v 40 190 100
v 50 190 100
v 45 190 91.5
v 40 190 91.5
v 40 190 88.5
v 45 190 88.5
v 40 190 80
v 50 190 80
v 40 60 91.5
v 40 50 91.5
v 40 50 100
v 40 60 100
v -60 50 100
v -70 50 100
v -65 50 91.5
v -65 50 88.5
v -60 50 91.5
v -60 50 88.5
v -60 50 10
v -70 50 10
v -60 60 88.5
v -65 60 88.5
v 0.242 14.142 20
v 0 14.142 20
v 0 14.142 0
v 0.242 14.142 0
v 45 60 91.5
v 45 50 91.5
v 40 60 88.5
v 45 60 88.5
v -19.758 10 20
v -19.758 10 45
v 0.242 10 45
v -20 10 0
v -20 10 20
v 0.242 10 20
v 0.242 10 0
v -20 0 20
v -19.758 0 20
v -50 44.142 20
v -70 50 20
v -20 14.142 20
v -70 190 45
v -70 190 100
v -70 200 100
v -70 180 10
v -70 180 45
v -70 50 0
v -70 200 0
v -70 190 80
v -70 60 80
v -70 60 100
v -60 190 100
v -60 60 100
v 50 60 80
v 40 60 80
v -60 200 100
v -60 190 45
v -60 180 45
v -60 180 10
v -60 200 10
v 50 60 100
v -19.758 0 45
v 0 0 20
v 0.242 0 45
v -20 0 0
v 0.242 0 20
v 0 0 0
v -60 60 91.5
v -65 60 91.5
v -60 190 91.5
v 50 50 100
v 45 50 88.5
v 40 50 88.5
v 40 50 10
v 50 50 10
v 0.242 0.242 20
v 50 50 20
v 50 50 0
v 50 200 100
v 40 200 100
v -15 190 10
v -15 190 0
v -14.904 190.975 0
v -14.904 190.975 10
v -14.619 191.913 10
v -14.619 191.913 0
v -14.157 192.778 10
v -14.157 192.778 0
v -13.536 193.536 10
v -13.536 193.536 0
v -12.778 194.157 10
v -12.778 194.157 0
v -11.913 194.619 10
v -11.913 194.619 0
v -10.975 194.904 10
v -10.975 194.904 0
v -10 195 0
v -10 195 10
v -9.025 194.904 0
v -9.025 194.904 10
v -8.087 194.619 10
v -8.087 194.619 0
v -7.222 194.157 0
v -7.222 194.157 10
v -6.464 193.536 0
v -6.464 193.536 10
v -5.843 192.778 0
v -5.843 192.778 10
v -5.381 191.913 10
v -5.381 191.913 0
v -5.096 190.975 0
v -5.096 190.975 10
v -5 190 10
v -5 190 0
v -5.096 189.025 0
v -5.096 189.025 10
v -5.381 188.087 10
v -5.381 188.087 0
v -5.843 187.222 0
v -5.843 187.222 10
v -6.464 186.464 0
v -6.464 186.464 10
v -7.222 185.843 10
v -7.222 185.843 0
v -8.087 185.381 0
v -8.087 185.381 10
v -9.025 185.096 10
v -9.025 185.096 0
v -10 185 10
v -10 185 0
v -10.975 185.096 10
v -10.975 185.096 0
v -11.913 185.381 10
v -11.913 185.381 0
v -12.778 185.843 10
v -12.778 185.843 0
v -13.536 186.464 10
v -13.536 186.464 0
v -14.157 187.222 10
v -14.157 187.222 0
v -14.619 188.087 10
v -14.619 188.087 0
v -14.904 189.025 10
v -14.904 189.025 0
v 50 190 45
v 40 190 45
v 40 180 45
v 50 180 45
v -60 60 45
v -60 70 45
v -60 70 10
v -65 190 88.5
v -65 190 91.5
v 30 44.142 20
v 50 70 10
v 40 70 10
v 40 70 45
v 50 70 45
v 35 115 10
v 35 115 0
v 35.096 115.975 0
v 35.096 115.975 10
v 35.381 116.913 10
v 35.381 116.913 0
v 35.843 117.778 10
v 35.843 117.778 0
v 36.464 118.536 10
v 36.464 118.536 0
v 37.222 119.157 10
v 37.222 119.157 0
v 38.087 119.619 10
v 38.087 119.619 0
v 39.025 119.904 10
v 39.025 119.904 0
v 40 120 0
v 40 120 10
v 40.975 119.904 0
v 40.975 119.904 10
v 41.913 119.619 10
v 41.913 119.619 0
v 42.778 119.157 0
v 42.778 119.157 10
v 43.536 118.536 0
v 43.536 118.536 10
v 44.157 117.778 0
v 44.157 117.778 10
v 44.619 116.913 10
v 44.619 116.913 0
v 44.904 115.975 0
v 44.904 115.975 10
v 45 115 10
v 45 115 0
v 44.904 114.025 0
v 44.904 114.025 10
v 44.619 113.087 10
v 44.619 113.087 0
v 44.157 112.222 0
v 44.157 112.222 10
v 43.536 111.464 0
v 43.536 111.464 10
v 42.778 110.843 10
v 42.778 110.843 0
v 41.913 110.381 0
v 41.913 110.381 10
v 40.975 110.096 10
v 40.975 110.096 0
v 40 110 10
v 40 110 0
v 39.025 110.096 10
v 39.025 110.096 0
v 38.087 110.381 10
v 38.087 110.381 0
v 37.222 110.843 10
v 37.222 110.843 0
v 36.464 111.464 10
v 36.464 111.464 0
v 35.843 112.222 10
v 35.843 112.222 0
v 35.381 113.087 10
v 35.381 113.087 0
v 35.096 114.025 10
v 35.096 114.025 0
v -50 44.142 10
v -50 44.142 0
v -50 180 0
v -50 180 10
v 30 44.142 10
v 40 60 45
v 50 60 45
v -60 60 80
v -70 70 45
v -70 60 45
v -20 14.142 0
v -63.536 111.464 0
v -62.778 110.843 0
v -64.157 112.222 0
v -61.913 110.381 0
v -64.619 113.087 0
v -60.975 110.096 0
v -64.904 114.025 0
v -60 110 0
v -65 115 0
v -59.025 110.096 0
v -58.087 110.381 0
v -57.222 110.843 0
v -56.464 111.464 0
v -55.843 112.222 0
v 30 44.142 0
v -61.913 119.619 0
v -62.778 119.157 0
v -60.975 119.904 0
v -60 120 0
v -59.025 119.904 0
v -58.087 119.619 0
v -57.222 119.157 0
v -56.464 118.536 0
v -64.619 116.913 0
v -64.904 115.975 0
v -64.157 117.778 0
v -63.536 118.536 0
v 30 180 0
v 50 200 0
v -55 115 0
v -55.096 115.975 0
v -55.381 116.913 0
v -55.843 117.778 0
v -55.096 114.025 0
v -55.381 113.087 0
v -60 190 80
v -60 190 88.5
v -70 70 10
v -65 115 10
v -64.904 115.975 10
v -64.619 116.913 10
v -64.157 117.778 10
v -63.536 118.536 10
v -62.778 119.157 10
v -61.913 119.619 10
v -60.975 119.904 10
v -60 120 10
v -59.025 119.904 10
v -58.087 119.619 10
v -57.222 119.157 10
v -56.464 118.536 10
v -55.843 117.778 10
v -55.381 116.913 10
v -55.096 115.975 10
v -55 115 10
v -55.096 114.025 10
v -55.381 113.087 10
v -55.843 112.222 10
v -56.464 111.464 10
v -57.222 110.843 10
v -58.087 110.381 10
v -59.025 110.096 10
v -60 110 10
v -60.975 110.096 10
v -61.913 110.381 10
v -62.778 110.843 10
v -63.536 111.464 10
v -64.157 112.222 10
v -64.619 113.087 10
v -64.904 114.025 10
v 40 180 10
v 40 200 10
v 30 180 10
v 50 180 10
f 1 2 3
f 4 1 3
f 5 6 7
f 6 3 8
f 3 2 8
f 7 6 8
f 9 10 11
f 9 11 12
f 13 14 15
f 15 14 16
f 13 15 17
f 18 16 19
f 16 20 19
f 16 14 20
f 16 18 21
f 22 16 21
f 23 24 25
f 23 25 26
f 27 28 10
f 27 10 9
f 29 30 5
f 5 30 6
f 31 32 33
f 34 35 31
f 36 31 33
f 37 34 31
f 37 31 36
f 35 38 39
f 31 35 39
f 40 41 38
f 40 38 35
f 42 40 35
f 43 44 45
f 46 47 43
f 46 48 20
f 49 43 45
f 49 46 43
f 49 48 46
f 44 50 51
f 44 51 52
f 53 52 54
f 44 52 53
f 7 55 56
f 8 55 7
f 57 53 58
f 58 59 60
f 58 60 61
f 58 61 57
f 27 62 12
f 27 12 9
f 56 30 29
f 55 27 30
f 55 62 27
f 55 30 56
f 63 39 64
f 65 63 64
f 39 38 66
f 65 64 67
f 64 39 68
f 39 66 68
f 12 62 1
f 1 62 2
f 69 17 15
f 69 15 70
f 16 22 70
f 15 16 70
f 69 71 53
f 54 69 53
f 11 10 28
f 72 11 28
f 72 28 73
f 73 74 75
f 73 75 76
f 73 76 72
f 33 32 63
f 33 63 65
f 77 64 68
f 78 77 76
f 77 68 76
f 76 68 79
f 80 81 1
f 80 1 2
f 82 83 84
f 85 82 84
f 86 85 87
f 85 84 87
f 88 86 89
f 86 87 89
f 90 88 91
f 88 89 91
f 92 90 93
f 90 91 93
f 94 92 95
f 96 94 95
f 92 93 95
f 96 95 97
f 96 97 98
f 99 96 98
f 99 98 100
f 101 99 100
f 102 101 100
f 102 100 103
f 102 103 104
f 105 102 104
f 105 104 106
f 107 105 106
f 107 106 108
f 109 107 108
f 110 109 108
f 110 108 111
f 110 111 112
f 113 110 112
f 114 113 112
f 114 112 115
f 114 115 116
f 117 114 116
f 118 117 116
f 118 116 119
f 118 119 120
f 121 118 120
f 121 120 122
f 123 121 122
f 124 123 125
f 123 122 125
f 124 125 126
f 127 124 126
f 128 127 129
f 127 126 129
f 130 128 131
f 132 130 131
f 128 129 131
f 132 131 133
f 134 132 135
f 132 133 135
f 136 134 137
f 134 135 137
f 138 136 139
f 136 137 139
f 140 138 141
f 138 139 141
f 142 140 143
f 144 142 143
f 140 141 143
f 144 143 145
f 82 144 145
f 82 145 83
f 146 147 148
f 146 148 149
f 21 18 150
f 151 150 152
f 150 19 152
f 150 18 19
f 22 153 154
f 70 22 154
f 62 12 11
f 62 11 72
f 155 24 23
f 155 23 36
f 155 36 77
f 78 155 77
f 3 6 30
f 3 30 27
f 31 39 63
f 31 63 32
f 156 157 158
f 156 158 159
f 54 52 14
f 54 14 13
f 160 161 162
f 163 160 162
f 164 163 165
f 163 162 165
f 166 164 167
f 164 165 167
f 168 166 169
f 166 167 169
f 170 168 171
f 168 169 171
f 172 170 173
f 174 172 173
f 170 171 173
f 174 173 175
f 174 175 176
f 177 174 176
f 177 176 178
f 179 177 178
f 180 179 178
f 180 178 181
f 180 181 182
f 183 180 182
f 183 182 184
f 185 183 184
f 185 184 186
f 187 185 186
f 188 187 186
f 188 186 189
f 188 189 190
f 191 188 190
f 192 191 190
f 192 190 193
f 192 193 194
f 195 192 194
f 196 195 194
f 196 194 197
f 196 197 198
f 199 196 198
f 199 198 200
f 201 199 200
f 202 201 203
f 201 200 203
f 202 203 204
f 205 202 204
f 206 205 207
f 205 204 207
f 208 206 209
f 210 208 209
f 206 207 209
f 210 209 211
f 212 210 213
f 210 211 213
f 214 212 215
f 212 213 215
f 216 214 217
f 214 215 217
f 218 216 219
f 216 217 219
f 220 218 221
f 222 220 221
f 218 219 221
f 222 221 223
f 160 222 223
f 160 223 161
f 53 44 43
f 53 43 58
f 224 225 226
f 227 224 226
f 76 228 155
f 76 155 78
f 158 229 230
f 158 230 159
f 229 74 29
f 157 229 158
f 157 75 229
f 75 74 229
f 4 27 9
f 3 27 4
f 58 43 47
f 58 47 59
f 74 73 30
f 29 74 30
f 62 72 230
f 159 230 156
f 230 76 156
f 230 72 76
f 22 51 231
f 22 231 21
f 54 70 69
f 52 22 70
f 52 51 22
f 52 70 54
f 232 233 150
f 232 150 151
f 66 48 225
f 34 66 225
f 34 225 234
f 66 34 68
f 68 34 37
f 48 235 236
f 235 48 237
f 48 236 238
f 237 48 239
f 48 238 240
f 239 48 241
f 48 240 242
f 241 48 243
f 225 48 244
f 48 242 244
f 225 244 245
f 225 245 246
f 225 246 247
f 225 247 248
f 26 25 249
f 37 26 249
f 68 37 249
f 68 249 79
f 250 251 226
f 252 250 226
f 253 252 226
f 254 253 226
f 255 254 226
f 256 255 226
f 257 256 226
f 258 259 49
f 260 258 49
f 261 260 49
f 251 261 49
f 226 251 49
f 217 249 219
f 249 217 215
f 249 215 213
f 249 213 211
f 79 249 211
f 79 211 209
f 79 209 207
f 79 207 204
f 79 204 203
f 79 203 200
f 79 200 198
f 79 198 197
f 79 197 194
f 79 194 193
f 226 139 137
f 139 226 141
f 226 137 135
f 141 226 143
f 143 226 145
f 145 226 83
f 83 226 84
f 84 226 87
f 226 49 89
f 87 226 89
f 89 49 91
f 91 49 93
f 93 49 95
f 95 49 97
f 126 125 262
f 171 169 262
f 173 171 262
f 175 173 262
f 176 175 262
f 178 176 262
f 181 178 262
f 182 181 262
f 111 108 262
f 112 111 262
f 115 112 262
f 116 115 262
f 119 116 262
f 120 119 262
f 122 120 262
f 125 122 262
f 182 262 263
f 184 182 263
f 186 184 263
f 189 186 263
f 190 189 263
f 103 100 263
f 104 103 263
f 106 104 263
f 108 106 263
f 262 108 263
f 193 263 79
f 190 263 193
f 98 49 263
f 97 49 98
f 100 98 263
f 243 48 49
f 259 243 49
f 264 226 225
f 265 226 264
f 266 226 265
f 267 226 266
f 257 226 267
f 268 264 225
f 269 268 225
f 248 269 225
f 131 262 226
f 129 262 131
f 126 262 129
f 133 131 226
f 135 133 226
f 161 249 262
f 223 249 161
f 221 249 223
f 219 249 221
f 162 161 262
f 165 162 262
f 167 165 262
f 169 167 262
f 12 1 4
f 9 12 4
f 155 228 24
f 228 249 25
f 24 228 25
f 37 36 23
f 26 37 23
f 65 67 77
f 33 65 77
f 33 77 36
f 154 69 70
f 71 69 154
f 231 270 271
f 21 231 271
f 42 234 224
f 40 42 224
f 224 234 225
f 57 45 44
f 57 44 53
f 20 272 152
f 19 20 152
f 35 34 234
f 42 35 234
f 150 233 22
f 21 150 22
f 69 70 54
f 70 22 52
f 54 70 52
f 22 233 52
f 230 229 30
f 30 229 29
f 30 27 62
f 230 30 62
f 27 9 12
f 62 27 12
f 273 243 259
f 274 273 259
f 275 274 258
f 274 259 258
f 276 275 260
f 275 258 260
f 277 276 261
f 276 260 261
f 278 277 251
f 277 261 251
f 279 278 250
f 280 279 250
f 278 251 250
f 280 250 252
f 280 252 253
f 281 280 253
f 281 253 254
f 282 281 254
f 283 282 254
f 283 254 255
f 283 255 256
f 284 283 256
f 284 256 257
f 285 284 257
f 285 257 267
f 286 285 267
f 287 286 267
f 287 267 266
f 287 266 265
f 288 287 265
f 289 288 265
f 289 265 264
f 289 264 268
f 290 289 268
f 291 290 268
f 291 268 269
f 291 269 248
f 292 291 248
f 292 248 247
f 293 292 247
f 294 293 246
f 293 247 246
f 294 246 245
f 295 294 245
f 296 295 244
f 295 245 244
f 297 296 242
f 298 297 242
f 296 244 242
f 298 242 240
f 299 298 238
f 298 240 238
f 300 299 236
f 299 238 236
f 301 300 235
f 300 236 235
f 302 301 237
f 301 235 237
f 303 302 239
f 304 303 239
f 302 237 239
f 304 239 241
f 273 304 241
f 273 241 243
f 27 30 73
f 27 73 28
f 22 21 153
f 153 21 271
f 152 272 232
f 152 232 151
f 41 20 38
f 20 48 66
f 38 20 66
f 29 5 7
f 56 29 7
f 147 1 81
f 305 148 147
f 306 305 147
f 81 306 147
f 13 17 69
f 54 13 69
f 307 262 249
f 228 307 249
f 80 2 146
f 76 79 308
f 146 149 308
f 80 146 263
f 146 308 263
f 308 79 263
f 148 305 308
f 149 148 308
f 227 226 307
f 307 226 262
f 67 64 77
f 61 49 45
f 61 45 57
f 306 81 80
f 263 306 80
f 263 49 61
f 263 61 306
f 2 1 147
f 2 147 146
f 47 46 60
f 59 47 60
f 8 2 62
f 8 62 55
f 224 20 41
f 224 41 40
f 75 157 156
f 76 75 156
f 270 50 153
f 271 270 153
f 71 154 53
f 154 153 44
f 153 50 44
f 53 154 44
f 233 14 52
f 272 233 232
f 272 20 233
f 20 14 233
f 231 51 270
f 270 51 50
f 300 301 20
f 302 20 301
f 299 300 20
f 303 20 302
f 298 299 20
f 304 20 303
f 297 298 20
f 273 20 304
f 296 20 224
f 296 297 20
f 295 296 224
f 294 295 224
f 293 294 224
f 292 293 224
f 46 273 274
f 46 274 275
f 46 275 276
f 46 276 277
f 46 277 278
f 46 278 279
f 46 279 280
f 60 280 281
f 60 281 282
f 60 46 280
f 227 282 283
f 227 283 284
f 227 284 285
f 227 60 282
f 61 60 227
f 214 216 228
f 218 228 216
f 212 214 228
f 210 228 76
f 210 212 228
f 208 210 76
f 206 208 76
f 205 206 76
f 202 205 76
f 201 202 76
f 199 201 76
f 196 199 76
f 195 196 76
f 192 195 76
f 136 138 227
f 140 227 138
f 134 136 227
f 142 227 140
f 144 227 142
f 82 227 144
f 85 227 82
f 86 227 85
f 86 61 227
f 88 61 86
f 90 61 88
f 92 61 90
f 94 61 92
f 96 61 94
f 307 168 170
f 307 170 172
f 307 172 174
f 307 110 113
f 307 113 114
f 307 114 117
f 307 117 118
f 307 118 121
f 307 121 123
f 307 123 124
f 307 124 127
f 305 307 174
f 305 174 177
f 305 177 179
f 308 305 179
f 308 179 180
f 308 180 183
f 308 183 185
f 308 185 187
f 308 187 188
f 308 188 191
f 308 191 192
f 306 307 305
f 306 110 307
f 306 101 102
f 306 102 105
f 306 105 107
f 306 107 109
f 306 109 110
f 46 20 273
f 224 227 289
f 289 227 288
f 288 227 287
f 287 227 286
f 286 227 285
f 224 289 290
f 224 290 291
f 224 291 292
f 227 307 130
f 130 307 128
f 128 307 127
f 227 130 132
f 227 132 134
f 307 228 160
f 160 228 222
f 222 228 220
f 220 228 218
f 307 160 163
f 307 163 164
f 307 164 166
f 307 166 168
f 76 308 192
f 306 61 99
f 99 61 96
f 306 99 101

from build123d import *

# Parameters (mm, degrees)
EXTRUSION2_DEPTH             = 20
ESQUISSE3_W                  = 89.728049728
ESQUISSE3_H                  = 20
ENL_V_MAT_EXTRU_1_DEPTH      = 10
ENL_V_MAT_EXTRU_3_DEPTH      = 50.727536527
ESQUISSE6_W                  = 10
ESQUISSE6_H                  = 20
EXTRUSION3_DEPTH             = 90
ESQUISSE7_W                  = 10
ESQUISSE7_H                  = 10
ENL_V_MAT_EXTRU_4_DEPTH      = 55
ESQUISSE8_W                  = 10
ESQUISSE8_H                  = 20
EXTRUSION7_DEPTH             = 90
EXTRUSION7_2_DEPTH           = 90
ESQUISSE9_W                  = 55
ESQUISSE9_H                  = 10
ENL_V_MAT_EXTRU_5_DEPTH      = 142.141603978
ESQUISSE10_W                 = 20
ESQUISSE10_H                 = 10
EXTRUSION8_DEPTH             = 25
ESQUISSE11_W                 = 20
ESQUISSE11_H                 = 130
EXTRUSION10_DEPTH            = 10
ESQUISSE12_W                 = 20
ESQUISSE12_H                 = 130
EXTRUSION12_DEPTH            = 10
ENL_V_MAT_EXTRU_6_DEPTH      = 105
ENL_V_MAT_EXTRU_6_DEPTH_BACK = 5
ESQUISSE13_W                 = 3
ESQUISSE13_H                 = 140
ENL_V_MAT_EXTRU_7_DEPTH      = 105
ENL_V_MAT_EXTRU_7_DEPTH_BACK = 5
ESQUISSE14_W                 = 3
ESQUISSE14_H                 = 11.069986055
ESQUISSE15_R                 = 5
ENL_V_MAT_EXTRU_8_DEPTH      = 28.101955853
ESQUISSE16_W                 = 20.242323371
ESQUISSE16_H                 = 4.142135624
ENL_V_MAT_EXTRU_9_DEPTH      = 28.101955853


with BuildPart() as part:
    # Esquisse2 → Extrusion2 (new body)
    with BuildSketch(Plane.XY):
        Polygon((-70, 50), (-20, 0), (0, 0), (50, 50), (50, 200), (-70, 200), align=None)
        Polygon((-50, 180), (30, 180), (30, 44.142135624), (0, 14.142135624), (-20, 14.142135624), (-50, 44.142135624), align=None, mode=Mode.SUBTRACT)
    extrude(amount=EXTRUSION2_DEPTH)

    # Esquisse3 → Enlèv. mat.-Extru.1 (cut)
    with BuildSketch(Plane.XY.offset(20)):
        with Locations((-5.135975136, 190)):
            Rectangle(ESQUISSE3_W, ESQUISSE3_H)
    extrude(amount=-ENL_V_MAT_EXTRU_1_DEPTH, mode=Mode.SUBTRACT)

    # Esquisse5 → Enlèv. mat.-Extru.3 (cut)
    with BuildSketch(Plane.XY.offset(10)):
        Polygon((-70, 50), (-50, 44.142135624), (30, 44.142135624), (50, 50), (50, 200), (-70, 200), align=None)
    extrude(amount=ENL_V_MAT_EXTRU_3_DEPTH, mode=Mode.SUBTRACT)

    # Esquisse6 → Extrusion3 (add)
    with BuildSketch(Plane.XY.offset(10)):
        with Locations((-65, 190)):
            Rectangle(ESQUISSE6_W, ESQUISSE6_H)
        with Locations((45, 190)):
            Rectangle(ESQUISSE6_W, ESQUISSE6_H)
    extrude(amount=EXTRUSION3_DEPTH)

    # Esquisse7 → Enlèv. mat.-Extru.4 (cut)
    with BuildSketch(Plane.XY.offset(100)):
        with Locations((-65, 185)):
            Rectangle(ESQUISSE7_W, ESQUISSE7_H)
        with Locations((45, 185)):
            Rectangle(ESQUISSE7_W, ESQUISSE7_H)
    extrude(amount=-ENL_V_MAT_EXTRU_4_DEPTH, mode=Mode.SUBTRACT)

    # Esquisse10 → Extrusion8 (add)
    with BuildSketch(Plane.XY.offset(20)):
        with Locations((-9.757676629, 5)):
            Rectangle(ESQUISSE10_W, ESQUISSE10_H)
    extrude(amount=EXTRUSION8_DEPTH)

    # Esquisse15 → Enlèv. mat.-Extru.8 (cut)
    with BuildSketch(Plane(origin=(0, 0, 0), x_dir=(-1, 0, 0), z_dir=(0, 0, -1))):
        with Locations((10, 190)):
            Circle(ESQUISSE15_R)
        with Locations((-40, 115)):
            Circle(ESQUISSE15_R)
        with Locations((60, 115)):
            Circle(ESQUISSE15_R)
    extrude(amount=-ENL_V_MAT_EXTRU_8_DEPTH, mode=Mode.SUBTRACT)

    # Esquisse16 → Enlèv. mat.-Extru.9 (cut)
    with BuildSketch(Plane.XY.offset(20)):
        with Locations((-9.878838314, 12.071067812)):
            Rectangle(ESQUISSE16_W, ESQUISSE16_H)
    extrude(amount=-ENL_V_MAT_EXTRU_9_DEPTH, mode=Mode.SUBTRACT)


with BuildPart() as body_2:
    # Esquisse8 → Extrusion7 (new body)
    with BuildSketch(Plane.XY.offset(10)):
        with Locations((-65, 60)):
            Rectangle(ESQUISSE8_W, ESQUISSE8_H)
    extrude(amount=EXTRUSION7_DEPTH)


with BuildPart() as body_3:
    # Esquisse8 → Extrusion7 2 (new body)
    with BuildSketch(Plane.XY.offset(10)):
        with Locations((45, 60)):
            Rectangle(ESQUISSE8_W, ESQUISSE8_H)
    extrude(amount=EXTRUSION7_2_DEPTH)


with BuildPart() as enl_v_mat_extru_5_tool:
    # Esquisse9 → Enlèv. mat.-Extru.5 (new body)
    with BuildSketch(Plane.ZY.offset(70)):
        with Locations((72.5, 65)):
            Rectangle(ESQUISSE9_W, ESQUISSE9_H)
    extrude(amount=-ENL_V_MAT_EXTRU_5_DEPTH)


with BuildPart() as body_2_1:
    add(body_2.part)

    # Enlèv. mat.-Extru.5: cut by enl_v_mat_extru_5_tool
    add(enl_v_mat_extru_5_tool.part, mode=Mode.SUBTRACT)


with BuildPart() as body_3_1:
    add(body_3.part)

    # Enlèv. mat.-Extru.5: cut by enl_v_mat_extru_5_tool
    add(enl_v_mat_extru_5_tool.part, mode=Mode.SUBTRACT)


with BuildPart() as body_4:
    # Esquisse11 → Extrusion10 (new body)
    with BuildSketch(Plane(origin=(50, 0, 0), x_dir=(0, 0, -1), z_dir=(1, 0, 0))):
        with Locations((-90, 125)):
            Rectangle(ESQUISSE11_W, ESQUISSE11_H)
    extrude(amount=-EXTRUSION10_DEPTH)


with BuildPart() as body_5:
    # Esquisse12 → Extrusion12 (new body)
    with BuildSketch(Plane.ZY.offset(70)):
        with Locations((90, 125)):
            Rectangle(ESQUISSE12_W, ESQUISSE12_H)
    extrude(amount=-EXTRUSION12_DEPTH)


with BuildPart() as enl_v_mat_extru_6_tool:
    # Esquisse13 → Enlèv. mat.-Extru.6 (new, two sides: drawn at the far end of the back side and taken through both)
    with BuildSketch(Plane.ZY.offset(-40).offset(-ENL_V_MAT_EXTRU_6_DEPTH_BACK)):
        with Locations((90, 120)):
            Rectangle(ESQUISSE13_W, ESQUISSE13_H)
    extrude(amount=ENL_V_MAT_EXTRU_6_DEPTH + ENL_V_MAT_EXTRU_6_DEPTH_BACK)


with BuildPart() as body_4_1:
    add(body_4.part)

    # Enlèv. mat.-Extru.6: cut by enl_v_mat_extru_6_tool
    add(enl_v_mat_extru_6_tool.part, mode=Mode.SUBTRACT)


with BuildPart() as body_5_1:
    add(body_5.part)

    # Enlèv. mat.-Extru.6: cut by enl_v_mat_extru_6_tool
    add(enl_v_mat_extru_6_tool.part, mode=Mode.SUBTRACT)


with BuildPart() as enl_v_mat_extru_7_tool:
    # Esquisse14 → Enlèv. mat.-Extru.7 (new, two sides: drawn at the far end of the back side and taken through both)
    with BuildSketch(Plane.ZY.offset(-40).offset(-ENL_V_MAT_EXTRU_7_DEPTH_BACK)):
        with Locations((90, 55.534993028)):
            Rectangle(ESQUISSE14_W, ESQUISSE14_H)
    extrude(amount=ENL_V_MAT_EXTRU_7_DEPTH + ENL_V_MAT_EXTRU_7_DEPTH_BACK)


with BuildPart() as body_2_2:
    add(body_2_1.part)

    # Enlèv. mat.-Extru.7: cut by enl_v_mat_extru_7_tool
    add(enl_v_mat_extru_7_tool.part, mode=Mode.SUBTRACT)


with BuildPart() as body_3_2:
    add(body_3_1.part)

    # Enlèv. mat.-Extru.7: cut by enl_v_mat_extru_7_tool
    add(enl_v_mat_extru_7_tool.part, mode=Mode.SUBTRACT)


solid = Compound([part.part, body_4_1.part, body_5_1.part, body_2_2.part, body_3_2.part])
